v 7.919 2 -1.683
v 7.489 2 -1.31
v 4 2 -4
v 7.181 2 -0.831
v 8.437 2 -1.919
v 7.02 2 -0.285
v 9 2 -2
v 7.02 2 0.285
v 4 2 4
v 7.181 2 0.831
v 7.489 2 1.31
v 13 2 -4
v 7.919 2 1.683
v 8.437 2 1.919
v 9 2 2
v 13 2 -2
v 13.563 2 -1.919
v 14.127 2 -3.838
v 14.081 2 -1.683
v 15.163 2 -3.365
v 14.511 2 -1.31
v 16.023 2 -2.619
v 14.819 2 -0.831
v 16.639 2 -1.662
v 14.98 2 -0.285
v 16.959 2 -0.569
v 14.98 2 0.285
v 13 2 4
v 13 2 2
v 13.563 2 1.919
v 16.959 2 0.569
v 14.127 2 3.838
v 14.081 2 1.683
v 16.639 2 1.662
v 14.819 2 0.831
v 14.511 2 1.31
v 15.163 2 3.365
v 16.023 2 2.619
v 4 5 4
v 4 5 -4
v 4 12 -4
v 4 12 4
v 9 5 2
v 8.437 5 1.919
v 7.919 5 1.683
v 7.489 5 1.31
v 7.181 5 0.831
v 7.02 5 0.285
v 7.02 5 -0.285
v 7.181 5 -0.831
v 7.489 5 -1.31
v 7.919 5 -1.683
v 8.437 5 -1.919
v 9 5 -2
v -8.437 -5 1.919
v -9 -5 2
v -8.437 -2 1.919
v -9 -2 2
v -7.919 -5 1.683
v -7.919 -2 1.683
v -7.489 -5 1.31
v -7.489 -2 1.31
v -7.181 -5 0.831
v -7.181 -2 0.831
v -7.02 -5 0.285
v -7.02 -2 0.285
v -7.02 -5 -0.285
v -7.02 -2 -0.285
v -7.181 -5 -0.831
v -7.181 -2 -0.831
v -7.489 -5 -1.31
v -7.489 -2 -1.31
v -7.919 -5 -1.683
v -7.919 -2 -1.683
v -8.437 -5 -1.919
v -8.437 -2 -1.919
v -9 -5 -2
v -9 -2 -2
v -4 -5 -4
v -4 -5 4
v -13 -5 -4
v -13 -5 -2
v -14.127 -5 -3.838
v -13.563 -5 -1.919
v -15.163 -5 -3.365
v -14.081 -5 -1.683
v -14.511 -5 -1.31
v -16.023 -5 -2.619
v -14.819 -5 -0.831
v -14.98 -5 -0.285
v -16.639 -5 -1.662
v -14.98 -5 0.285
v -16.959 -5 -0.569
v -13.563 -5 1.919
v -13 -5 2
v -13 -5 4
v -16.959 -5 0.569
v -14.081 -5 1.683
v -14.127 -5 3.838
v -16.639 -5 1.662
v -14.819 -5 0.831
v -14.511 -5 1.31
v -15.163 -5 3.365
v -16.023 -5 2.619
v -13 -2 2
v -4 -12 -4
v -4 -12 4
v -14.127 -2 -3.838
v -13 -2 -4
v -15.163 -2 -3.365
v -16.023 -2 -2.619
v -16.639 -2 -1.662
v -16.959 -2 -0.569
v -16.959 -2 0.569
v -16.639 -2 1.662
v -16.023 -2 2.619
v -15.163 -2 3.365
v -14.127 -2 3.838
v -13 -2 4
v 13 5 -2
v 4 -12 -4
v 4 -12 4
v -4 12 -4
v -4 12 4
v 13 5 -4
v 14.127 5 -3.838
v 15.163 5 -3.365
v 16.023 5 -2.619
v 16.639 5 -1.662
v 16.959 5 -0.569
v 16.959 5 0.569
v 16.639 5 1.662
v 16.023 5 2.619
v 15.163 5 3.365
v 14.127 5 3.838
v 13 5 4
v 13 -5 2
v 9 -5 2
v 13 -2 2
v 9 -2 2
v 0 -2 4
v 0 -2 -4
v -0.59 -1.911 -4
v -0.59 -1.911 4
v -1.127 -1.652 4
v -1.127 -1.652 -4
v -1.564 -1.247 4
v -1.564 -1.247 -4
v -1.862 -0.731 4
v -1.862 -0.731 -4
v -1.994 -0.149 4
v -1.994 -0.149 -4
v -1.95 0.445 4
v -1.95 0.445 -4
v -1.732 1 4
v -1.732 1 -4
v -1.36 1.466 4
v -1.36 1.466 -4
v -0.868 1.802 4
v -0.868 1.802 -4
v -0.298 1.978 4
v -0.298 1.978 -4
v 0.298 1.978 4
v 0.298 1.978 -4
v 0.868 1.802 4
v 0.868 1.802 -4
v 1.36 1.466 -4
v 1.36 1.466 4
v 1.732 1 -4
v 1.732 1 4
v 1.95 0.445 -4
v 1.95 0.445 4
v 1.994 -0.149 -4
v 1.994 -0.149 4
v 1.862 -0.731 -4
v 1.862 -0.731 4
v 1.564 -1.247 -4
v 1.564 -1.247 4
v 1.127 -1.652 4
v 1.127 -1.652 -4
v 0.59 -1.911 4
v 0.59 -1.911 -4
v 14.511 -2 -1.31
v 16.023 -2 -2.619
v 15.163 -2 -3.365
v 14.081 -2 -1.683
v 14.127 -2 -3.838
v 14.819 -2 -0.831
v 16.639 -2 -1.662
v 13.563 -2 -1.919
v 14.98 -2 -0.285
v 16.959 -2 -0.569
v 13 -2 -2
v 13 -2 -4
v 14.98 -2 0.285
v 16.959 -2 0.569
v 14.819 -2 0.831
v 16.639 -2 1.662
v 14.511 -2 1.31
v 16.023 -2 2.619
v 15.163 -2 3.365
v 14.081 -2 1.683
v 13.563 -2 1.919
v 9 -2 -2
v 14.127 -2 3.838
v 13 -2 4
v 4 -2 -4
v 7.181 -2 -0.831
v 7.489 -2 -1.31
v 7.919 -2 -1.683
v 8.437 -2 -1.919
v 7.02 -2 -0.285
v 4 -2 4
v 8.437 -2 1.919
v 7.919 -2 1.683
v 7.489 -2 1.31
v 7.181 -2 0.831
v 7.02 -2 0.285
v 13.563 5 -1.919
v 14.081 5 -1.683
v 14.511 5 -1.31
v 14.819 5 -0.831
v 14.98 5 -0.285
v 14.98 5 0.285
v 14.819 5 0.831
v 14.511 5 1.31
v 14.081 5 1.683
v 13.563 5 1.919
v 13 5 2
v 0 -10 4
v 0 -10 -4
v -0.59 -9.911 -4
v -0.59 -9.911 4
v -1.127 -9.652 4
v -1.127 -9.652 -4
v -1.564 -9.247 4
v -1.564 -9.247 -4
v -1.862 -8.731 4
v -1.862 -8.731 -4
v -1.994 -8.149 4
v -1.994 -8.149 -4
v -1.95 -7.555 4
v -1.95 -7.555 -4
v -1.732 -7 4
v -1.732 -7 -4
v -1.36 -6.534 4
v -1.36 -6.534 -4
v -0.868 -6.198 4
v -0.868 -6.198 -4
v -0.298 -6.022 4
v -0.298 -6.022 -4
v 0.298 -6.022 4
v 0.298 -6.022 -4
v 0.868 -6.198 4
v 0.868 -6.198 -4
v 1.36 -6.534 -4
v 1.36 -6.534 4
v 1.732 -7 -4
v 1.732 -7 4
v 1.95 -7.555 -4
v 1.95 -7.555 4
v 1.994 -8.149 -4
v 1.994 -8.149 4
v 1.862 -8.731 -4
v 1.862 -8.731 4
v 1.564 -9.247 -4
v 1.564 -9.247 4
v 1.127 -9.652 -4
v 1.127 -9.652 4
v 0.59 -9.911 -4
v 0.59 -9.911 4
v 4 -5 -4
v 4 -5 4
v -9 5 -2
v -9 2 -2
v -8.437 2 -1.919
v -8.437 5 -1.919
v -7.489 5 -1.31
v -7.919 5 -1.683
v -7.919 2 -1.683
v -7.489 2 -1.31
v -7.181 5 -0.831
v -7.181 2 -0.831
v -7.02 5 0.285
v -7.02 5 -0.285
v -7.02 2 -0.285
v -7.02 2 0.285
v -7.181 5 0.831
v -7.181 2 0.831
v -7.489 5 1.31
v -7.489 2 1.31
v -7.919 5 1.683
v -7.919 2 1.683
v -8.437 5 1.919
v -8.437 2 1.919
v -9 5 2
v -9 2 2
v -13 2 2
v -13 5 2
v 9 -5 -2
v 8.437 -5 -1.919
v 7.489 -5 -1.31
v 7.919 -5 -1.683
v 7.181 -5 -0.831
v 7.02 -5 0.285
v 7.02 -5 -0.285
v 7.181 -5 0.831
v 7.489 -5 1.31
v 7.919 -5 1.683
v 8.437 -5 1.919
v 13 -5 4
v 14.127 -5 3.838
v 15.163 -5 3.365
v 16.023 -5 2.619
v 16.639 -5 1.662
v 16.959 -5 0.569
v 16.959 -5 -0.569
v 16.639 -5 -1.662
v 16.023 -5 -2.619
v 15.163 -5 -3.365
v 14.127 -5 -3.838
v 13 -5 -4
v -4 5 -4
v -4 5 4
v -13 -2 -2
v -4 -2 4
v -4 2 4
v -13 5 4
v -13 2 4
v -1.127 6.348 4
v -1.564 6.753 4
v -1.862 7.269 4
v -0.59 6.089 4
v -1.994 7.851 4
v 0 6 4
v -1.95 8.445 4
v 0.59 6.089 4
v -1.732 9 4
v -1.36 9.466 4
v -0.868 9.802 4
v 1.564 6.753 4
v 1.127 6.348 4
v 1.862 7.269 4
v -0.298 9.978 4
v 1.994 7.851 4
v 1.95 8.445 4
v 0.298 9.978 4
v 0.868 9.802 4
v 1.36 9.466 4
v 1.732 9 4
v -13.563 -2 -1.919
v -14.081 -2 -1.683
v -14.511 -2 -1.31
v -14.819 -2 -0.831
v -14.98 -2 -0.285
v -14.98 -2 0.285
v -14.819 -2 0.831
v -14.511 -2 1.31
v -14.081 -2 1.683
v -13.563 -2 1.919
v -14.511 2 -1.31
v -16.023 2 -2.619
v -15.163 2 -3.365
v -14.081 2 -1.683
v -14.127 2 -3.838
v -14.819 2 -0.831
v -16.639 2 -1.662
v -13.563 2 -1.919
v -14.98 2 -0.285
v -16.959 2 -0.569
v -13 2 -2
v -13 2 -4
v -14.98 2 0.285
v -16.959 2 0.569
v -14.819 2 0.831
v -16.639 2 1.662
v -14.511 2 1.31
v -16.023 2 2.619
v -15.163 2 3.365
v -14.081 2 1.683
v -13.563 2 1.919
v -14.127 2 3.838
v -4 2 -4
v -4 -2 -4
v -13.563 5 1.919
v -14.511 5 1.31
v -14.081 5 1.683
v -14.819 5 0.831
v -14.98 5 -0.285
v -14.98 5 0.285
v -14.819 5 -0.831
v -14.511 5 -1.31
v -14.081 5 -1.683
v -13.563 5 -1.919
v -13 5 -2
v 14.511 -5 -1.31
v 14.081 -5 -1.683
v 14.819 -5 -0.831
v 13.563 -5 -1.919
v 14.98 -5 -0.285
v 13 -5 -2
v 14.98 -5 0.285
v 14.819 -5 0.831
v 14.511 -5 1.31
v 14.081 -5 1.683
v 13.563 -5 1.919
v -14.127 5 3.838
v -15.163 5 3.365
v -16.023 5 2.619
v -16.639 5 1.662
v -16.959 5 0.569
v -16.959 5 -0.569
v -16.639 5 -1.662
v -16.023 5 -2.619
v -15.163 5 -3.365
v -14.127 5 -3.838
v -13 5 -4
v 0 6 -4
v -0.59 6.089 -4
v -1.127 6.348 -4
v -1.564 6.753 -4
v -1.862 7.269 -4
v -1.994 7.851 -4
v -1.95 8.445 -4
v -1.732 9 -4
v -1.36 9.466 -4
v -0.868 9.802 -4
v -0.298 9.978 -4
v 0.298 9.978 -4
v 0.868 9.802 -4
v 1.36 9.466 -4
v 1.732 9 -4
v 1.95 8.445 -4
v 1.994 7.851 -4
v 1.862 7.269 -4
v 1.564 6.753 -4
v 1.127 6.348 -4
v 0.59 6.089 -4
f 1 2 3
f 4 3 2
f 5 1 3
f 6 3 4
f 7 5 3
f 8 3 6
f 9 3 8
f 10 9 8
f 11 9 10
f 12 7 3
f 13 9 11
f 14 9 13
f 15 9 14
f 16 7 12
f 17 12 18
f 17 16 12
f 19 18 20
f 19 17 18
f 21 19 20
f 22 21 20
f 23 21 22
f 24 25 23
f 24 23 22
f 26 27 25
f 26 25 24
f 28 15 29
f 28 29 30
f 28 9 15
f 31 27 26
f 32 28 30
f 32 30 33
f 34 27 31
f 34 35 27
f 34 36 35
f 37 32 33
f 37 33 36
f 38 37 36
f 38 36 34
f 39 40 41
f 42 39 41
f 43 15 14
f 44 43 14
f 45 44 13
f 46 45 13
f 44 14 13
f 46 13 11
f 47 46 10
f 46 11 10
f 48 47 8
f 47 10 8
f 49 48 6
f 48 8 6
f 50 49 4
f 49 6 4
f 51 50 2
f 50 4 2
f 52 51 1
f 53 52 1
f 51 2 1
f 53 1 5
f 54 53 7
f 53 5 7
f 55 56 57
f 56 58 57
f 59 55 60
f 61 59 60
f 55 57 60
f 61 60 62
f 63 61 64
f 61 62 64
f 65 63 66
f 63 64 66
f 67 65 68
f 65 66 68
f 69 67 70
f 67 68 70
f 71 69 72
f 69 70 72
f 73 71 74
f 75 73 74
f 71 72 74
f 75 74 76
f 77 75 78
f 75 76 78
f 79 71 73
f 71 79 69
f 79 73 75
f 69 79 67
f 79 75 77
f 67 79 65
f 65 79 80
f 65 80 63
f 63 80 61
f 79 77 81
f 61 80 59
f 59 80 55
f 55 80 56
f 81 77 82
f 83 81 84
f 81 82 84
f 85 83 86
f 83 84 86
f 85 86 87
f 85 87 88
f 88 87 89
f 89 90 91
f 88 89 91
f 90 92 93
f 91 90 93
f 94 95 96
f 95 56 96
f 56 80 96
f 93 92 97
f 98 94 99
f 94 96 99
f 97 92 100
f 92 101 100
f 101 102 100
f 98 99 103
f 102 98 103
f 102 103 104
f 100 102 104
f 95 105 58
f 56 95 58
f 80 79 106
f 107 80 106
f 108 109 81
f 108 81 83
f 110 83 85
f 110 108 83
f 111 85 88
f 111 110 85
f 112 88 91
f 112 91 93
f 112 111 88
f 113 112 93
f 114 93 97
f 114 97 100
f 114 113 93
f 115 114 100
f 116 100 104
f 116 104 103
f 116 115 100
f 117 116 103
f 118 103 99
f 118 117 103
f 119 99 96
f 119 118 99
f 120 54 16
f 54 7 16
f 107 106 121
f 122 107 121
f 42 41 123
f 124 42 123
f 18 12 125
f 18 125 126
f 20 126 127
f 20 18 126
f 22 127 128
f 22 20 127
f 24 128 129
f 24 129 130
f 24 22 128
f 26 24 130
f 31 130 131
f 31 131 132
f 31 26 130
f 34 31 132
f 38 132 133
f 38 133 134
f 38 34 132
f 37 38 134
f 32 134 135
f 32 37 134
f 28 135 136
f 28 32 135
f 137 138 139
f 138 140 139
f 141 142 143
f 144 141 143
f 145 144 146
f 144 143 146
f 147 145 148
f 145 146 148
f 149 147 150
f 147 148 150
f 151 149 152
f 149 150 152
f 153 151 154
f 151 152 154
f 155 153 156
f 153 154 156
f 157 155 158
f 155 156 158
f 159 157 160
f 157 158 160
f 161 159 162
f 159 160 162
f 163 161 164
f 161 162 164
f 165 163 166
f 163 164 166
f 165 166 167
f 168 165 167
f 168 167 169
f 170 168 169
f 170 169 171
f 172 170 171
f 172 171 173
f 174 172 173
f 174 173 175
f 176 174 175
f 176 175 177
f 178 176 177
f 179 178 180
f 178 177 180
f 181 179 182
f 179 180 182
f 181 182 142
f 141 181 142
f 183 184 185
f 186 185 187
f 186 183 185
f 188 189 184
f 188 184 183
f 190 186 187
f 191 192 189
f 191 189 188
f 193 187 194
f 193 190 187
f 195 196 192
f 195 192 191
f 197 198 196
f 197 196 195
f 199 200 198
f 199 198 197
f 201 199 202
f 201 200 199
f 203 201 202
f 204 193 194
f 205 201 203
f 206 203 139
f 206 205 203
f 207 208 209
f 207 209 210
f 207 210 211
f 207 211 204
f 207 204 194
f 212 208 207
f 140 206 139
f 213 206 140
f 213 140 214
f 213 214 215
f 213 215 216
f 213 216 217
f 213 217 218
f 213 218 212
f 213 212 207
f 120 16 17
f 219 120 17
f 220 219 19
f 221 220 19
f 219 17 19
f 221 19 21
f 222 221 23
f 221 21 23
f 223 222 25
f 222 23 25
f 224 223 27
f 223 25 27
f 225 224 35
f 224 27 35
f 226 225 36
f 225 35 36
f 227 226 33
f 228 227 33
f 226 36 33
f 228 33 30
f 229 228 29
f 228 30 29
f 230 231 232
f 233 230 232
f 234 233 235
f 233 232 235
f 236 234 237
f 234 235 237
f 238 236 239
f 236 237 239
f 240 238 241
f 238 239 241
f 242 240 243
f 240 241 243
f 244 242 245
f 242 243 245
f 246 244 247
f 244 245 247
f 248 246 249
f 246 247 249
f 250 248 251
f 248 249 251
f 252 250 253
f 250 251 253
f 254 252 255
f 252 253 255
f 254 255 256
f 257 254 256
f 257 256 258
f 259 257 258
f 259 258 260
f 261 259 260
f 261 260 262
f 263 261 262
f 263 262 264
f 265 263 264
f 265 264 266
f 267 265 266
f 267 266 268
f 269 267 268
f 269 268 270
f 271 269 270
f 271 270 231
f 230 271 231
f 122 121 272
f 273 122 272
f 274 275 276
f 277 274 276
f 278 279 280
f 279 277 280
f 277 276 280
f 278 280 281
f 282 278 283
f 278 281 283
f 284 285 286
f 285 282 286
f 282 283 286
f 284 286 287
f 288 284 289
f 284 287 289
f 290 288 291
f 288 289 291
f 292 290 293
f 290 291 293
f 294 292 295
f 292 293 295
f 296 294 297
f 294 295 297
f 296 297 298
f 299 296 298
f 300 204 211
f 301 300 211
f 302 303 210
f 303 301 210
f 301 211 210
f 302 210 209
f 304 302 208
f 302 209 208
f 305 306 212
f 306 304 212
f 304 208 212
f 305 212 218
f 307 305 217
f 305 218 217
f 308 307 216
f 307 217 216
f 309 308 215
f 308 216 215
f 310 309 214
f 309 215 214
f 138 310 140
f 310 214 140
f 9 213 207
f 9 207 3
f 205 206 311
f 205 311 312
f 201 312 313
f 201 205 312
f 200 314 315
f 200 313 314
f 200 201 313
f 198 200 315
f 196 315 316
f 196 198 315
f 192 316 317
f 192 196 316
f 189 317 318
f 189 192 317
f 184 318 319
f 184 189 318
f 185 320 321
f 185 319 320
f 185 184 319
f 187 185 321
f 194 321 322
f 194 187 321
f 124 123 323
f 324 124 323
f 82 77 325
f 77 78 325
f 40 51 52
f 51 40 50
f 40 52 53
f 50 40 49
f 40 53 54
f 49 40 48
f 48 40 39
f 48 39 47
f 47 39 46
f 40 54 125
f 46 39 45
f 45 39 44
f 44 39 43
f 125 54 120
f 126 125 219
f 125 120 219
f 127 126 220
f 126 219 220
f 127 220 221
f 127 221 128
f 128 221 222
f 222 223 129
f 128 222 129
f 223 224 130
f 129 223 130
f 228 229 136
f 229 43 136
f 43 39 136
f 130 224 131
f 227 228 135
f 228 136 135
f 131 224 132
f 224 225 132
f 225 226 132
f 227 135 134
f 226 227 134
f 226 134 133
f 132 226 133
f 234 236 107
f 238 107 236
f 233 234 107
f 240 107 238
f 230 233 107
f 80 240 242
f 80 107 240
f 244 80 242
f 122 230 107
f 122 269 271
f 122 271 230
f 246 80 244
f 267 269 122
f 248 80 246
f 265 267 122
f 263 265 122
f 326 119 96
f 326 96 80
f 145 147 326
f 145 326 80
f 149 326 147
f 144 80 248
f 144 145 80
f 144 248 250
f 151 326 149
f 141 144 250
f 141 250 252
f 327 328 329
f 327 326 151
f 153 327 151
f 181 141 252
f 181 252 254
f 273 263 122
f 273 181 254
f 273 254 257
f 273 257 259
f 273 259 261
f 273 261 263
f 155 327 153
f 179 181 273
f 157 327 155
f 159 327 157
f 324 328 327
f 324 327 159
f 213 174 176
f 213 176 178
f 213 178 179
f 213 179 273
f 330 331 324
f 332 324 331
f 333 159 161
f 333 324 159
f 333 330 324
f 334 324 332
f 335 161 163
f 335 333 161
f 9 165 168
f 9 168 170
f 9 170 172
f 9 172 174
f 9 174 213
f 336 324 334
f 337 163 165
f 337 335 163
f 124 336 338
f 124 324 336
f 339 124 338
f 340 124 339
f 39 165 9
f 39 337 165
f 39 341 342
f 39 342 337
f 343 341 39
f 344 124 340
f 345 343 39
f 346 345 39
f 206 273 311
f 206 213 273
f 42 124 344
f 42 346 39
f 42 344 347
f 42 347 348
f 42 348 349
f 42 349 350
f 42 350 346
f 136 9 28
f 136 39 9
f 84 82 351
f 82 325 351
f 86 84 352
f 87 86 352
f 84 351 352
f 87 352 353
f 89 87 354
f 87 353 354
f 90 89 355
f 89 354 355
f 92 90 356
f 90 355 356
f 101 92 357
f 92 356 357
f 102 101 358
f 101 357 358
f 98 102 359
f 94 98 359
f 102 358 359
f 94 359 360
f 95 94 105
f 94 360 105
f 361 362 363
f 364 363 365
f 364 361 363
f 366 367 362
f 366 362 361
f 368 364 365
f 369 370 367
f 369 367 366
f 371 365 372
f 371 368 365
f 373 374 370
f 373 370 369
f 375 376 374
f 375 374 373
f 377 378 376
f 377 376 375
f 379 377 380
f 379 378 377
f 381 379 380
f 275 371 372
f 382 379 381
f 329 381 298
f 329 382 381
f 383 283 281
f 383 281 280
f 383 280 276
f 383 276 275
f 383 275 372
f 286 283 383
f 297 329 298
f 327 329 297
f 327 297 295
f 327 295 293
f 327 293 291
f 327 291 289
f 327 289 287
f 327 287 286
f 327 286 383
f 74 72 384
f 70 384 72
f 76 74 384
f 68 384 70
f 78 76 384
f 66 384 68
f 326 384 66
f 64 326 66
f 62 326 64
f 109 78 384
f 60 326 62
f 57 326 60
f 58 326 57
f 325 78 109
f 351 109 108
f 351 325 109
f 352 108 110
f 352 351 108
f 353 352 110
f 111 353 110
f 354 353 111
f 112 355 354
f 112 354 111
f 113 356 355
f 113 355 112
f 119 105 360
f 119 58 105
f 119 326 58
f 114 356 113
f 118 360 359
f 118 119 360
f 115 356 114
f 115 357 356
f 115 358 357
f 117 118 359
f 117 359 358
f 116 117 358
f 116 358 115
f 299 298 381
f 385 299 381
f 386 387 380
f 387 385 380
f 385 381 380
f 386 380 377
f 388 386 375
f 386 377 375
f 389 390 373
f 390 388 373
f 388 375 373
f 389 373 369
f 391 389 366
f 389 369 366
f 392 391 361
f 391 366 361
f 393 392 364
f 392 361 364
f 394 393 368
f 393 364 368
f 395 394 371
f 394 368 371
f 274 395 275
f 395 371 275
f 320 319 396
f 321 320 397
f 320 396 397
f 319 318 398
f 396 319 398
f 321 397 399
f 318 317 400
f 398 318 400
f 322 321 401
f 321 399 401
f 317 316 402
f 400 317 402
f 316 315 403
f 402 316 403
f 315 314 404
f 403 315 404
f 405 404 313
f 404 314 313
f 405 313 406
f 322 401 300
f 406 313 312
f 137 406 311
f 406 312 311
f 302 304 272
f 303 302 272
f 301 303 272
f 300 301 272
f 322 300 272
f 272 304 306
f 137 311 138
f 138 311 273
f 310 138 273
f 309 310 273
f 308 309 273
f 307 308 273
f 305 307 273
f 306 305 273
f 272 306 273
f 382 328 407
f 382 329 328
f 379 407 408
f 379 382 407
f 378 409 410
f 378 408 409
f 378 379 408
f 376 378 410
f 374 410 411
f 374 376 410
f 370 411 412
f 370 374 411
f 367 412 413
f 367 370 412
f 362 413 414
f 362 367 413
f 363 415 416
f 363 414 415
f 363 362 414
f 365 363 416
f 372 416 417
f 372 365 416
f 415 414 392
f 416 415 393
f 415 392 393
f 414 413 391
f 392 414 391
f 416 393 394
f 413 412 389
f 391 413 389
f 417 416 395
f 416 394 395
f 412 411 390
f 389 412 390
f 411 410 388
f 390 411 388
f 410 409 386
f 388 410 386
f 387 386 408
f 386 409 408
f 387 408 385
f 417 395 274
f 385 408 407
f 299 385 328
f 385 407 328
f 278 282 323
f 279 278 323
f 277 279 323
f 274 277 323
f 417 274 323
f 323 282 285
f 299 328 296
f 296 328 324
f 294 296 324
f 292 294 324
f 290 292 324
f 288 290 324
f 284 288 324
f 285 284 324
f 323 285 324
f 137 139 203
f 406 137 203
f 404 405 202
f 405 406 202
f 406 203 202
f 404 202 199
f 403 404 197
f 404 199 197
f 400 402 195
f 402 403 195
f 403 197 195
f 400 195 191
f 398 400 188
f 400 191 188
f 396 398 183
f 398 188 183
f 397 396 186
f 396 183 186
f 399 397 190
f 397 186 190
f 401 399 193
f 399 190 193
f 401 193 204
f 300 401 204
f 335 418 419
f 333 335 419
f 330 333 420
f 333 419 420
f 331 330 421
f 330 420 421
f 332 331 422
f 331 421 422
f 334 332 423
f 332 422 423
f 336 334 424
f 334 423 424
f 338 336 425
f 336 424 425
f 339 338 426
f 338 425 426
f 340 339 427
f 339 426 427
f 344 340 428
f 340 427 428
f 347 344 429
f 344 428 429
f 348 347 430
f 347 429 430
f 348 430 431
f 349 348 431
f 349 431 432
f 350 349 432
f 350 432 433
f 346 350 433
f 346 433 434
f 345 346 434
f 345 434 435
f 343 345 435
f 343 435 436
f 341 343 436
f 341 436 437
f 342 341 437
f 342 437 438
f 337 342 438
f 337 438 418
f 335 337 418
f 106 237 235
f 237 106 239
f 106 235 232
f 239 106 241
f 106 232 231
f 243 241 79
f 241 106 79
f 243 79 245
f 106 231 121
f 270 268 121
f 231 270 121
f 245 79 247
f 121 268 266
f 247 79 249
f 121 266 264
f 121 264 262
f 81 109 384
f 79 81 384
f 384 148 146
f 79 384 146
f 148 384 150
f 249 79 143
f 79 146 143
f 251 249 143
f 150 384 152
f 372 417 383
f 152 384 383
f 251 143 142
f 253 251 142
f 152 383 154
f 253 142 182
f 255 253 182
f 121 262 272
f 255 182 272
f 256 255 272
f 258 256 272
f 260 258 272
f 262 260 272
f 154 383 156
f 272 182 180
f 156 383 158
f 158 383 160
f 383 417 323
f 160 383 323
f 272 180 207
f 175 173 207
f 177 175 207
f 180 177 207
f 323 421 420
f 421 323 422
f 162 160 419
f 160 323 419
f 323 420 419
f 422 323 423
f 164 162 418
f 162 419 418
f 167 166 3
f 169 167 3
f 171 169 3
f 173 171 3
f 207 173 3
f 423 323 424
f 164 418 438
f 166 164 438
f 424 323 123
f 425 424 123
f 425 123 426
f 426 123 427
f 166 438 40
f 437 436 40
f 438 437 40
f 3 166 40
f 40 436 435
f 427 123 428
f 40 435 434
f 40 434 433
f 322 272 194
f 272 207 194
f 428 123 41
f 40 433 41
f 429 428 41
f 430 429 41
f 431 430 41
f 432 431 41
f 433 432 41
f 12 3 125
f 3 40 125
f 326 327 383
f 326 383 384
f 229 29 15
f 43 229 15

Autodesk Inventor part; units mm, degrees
ref_plane "YZ Plane" through (0, 0, 0) normal (1, 0, 0) x (0, 1, 0)
ref_plane "XY Plane" through (0, 0, 0) normal (0, 0, 1) x (1, 0, 0)
sketch "Sketch1" plane through (0, 0, 0) normal (0, 0, 1) x (1, 0, 0)
  line L0 (-4, -12) -> (4, -12)
  line L1 (4, -12) -> (4, 12)
  line L2 (4, 12) -> (-4, 12)
  line L3 (-4, 12) -> (-4, -12)
  line L4 (-4, -12) -> (4, 12) construction
  line L5 (4, -12) -> (-4, 12) construction
  point P0 (0, 0)
  dimension "d0" = 8
  dimension "d1" = 24
extrude "Extrusion1" add sketch "Sketch1" along normal mid plane 8
ref_plane "Work Plane1" through (0, -2, 0) normal (0, 1, 0) x (-1, 0, 0)
sketch "Sketch3" plane through (0, -2, 0) normal (0, 1, 0) x (-1, 0, 0)
  line L0 (4, -4) -> (4, 4) projected
  line L1 (4, 4) -> (13, 4)
  arc A0 (13, -4) -> (13, 4) centre (13, 0) ccw
  line L2 (13, -4) -> (4, -4)
  line L3 (4, 4) -> (4, -4)
  line L4 (9, 0) -> (13, 0) construction
  line L5 (9, -2) -> (13, -2)
  line L6 (13, 2) -> (9, 2)
  arc A1 (9, 2) -> (9, -2) centre (9, 0) ccw
  arc A2 (13, -2) -> (13, 2) centre (13, 0) ccw
  point P0 (0, 0)
  point P1 (11, 0)
  dimension "d8" = 4
  dimension "d9" = 9
  dimension "d10" = 4
  dimension "d11" = 2
extrude "Extrusion2" add sketch "Sketch3" against normal blind 3
mirror "Mirror1" about plane through (0, 0, 0) normal (0, 1, 0) of "Extrusion2"
mirror "Mirror2" about plane through (0, 0, 0) normal (1, 0, 0) of "Extrusion2", "Mirror1"
sketch "Sketch4" plane through (0, 0, 4) normal (0, 0, 1) x (1, 0, 0)
  point P0 (0, 0)
  point P1 (0, -8)
  point P2 (0, 0)
  point P3 (0, 8)
  dimension "d14" = 8
  dimension "d15" = 8
hole "Hole1" at (0, -8, 4) at (0, 0, 4) at (0, 8, 4) direction (0, 0, -1) diameter 4 depth 8
sketch "Sketch5" plane through (4, -5, -4) normal (0, -1, 0) x (1, 0, 0)
  arc A0 (9, 2) -> (9, 6) centre (9, 4) ccw projected
  circle A1 centre (-14, 4) radius 2
  arc A2 (-13, 2) -> (-13, 6) centre (-13, 4) ccw projected
  arc A3 (-17, 6) -> (-17, 2) centre (-17, 4) ccw projected
  circle A4 centre (-14, 4) radius 2
  point P0 (-4, 4)
  point P1 (11, 4)
  point P2 (-11, 4)
  point P3 (-19, 4)
  dimension "d25" = 4
  dimension "d26" = 5
sketch "Sketch6" plane through (-13, 5, -4) normal (0, 1, 0) x (1, 0, 0)
  arc A0 (0, -2) -> (0, -6) centre (0, -4) ccw projected
  circle A1 centre (23, -4) radius 2
  arc A2 (26, -6) -> (26, -2) centre (26, -4) ccw projected
  arc A3 (22, -2) -> (22, -6) centre (22, -4) ccw projected
  point P0 (13, -4)
  point P1 (-2, -4)
  point P2 (28, -4)
  point P3 (20, -4)
  point P4 (28, -4)
  dimension "d28" = 4
  dimension "d31" = 5
equation "\"d15\" = d14"
properties part number "08"
